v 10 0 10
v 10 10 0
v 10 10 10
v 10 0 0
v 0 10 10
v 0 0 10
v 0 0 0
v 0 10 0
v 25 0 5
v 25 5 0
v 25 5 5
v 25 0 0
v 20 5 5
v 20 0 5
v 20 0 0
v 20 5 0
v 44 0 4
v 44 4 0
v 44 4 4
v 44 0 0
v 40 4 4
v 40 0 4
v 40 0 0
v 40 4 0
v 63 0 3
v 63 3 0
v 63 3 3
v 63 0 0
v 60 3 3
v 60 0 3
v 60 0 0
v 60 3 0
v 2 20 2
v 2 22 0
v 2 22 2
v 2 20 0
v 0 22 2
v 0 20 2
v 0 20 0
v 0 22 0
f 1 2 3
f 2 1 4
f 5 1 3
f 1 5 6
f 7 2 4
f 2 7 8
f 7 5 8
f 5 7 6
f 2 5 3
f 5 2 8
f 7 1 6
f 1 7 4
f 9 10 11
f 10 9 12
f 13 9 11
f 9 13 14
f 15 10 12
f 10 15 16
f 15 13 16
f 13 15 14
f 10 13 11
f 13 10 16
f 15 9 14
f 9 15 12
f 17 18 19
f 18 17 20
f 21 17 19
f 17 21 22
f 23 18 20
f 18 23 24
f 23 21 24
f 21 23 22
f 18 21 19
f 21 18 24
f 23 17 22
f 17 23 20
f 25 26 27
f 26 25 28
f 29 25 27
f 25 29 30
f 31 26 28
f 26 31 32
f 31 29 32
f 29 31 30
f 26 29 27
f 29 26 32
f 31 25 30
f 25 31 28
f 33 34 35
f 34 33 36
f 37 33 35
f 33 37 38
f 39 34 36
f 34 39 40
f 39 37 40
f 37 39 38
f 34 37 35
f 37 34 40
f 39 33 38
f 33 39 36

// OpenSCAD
// two-colour.scad — five disjoint cubes under color(): used to prove that
// color() becomes Parts on first open (one Part per distinct colour).
//   red  : 10^3 + 2^3  = 1008 mm3   (solid-0 and solid-4)
//   blue : 5^3  + 4^3  =  189 mm3   (solid-1, a vector colour under a translate,
//                                    and solid-2, a named colour above one)
//   none : 3^3         =   27 mm3   (solid-3 — outside any color(), no Part)
color("red") cube([10, 10, 10]);
translate([20, 0, 0]) color([0, 0, 1]) cube([5, 5, 5]);
color("blue") translate([40, 0, 0]) cube([4, 4, 4]);
translate([60, 0, 0]) cube([3, 3, 3]);
color("red") translate([0, 20, 0]) cube([2, 2, 2]);
